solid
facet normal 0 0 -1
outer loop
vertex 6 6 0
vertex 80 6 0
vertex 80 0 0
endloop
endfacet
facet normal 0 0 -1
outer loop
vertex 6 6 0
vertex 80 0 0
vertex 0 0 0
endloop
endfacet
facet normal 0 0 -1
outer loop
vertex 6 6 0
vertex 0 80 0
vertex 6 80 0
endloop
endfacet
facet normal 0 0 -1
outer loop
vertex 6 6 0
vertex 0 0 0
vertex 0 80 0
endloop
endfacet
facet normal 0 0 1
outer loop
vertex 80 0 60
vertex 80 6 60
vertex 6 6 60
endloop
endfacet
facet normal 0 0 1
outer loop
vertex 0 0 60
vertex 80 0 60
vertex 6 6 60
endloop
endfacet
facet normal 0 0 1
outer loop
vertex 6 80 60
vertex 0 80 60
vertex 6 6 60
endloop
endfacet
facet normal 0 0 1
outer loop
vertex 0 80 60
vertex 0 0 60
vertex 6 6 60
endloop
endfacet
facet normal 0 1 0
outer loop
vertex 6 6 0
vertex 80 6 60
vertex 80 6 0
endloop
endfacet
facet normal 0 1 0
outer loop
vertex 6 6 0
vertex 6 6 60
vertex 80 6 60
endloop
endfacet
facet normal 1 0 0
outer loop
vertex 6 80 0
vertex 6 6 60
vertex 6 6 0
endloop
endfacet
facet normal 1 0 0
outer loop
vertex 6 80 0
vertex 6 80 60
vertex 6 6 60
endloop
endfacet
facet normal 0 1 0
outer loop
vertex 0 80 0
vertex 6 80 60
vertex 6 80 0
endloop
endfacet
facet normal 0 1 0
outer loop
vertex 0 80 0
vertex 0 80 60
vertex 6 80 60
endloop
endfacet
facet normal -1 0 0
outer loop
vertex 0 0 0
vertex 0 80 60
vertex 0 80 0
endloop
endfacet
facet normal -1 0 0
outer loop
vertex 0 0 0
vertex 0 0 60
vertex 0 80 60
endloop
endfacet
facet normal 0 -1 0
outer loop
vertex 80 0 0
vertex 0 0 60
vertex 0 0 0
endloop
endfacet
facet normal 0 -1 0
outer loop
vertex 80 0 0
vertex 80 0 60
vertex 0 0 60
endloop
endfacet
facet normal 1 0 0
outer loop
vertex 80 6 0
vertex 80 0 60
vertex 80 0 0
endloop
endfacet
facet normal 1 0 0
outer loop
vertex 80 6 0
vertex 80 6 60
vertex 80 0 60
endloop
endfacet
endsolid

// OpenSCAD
$fn = 32;

// ----------------------------------------------------------------------
// Structural section: angle 80 x 80 mm
// ----------------------------------------------------------------------

// --- parameters (mm) ---
sec_w = 80;               // leg width, X
sec_h = 80;               // leg height, Y
flange_t = 6;             // leg thickness
plate_t = 60;             // cut length, Z (extrusion height)

profile = [[0, 0], [80, 0], [80, 6], [6, 6], [6, 80], [0, 80]];  // primary outline, 6 points, counter clockwise

// --- the one profile operation ---
linear_extrude(height = plate_t) polygon(points = profile);
